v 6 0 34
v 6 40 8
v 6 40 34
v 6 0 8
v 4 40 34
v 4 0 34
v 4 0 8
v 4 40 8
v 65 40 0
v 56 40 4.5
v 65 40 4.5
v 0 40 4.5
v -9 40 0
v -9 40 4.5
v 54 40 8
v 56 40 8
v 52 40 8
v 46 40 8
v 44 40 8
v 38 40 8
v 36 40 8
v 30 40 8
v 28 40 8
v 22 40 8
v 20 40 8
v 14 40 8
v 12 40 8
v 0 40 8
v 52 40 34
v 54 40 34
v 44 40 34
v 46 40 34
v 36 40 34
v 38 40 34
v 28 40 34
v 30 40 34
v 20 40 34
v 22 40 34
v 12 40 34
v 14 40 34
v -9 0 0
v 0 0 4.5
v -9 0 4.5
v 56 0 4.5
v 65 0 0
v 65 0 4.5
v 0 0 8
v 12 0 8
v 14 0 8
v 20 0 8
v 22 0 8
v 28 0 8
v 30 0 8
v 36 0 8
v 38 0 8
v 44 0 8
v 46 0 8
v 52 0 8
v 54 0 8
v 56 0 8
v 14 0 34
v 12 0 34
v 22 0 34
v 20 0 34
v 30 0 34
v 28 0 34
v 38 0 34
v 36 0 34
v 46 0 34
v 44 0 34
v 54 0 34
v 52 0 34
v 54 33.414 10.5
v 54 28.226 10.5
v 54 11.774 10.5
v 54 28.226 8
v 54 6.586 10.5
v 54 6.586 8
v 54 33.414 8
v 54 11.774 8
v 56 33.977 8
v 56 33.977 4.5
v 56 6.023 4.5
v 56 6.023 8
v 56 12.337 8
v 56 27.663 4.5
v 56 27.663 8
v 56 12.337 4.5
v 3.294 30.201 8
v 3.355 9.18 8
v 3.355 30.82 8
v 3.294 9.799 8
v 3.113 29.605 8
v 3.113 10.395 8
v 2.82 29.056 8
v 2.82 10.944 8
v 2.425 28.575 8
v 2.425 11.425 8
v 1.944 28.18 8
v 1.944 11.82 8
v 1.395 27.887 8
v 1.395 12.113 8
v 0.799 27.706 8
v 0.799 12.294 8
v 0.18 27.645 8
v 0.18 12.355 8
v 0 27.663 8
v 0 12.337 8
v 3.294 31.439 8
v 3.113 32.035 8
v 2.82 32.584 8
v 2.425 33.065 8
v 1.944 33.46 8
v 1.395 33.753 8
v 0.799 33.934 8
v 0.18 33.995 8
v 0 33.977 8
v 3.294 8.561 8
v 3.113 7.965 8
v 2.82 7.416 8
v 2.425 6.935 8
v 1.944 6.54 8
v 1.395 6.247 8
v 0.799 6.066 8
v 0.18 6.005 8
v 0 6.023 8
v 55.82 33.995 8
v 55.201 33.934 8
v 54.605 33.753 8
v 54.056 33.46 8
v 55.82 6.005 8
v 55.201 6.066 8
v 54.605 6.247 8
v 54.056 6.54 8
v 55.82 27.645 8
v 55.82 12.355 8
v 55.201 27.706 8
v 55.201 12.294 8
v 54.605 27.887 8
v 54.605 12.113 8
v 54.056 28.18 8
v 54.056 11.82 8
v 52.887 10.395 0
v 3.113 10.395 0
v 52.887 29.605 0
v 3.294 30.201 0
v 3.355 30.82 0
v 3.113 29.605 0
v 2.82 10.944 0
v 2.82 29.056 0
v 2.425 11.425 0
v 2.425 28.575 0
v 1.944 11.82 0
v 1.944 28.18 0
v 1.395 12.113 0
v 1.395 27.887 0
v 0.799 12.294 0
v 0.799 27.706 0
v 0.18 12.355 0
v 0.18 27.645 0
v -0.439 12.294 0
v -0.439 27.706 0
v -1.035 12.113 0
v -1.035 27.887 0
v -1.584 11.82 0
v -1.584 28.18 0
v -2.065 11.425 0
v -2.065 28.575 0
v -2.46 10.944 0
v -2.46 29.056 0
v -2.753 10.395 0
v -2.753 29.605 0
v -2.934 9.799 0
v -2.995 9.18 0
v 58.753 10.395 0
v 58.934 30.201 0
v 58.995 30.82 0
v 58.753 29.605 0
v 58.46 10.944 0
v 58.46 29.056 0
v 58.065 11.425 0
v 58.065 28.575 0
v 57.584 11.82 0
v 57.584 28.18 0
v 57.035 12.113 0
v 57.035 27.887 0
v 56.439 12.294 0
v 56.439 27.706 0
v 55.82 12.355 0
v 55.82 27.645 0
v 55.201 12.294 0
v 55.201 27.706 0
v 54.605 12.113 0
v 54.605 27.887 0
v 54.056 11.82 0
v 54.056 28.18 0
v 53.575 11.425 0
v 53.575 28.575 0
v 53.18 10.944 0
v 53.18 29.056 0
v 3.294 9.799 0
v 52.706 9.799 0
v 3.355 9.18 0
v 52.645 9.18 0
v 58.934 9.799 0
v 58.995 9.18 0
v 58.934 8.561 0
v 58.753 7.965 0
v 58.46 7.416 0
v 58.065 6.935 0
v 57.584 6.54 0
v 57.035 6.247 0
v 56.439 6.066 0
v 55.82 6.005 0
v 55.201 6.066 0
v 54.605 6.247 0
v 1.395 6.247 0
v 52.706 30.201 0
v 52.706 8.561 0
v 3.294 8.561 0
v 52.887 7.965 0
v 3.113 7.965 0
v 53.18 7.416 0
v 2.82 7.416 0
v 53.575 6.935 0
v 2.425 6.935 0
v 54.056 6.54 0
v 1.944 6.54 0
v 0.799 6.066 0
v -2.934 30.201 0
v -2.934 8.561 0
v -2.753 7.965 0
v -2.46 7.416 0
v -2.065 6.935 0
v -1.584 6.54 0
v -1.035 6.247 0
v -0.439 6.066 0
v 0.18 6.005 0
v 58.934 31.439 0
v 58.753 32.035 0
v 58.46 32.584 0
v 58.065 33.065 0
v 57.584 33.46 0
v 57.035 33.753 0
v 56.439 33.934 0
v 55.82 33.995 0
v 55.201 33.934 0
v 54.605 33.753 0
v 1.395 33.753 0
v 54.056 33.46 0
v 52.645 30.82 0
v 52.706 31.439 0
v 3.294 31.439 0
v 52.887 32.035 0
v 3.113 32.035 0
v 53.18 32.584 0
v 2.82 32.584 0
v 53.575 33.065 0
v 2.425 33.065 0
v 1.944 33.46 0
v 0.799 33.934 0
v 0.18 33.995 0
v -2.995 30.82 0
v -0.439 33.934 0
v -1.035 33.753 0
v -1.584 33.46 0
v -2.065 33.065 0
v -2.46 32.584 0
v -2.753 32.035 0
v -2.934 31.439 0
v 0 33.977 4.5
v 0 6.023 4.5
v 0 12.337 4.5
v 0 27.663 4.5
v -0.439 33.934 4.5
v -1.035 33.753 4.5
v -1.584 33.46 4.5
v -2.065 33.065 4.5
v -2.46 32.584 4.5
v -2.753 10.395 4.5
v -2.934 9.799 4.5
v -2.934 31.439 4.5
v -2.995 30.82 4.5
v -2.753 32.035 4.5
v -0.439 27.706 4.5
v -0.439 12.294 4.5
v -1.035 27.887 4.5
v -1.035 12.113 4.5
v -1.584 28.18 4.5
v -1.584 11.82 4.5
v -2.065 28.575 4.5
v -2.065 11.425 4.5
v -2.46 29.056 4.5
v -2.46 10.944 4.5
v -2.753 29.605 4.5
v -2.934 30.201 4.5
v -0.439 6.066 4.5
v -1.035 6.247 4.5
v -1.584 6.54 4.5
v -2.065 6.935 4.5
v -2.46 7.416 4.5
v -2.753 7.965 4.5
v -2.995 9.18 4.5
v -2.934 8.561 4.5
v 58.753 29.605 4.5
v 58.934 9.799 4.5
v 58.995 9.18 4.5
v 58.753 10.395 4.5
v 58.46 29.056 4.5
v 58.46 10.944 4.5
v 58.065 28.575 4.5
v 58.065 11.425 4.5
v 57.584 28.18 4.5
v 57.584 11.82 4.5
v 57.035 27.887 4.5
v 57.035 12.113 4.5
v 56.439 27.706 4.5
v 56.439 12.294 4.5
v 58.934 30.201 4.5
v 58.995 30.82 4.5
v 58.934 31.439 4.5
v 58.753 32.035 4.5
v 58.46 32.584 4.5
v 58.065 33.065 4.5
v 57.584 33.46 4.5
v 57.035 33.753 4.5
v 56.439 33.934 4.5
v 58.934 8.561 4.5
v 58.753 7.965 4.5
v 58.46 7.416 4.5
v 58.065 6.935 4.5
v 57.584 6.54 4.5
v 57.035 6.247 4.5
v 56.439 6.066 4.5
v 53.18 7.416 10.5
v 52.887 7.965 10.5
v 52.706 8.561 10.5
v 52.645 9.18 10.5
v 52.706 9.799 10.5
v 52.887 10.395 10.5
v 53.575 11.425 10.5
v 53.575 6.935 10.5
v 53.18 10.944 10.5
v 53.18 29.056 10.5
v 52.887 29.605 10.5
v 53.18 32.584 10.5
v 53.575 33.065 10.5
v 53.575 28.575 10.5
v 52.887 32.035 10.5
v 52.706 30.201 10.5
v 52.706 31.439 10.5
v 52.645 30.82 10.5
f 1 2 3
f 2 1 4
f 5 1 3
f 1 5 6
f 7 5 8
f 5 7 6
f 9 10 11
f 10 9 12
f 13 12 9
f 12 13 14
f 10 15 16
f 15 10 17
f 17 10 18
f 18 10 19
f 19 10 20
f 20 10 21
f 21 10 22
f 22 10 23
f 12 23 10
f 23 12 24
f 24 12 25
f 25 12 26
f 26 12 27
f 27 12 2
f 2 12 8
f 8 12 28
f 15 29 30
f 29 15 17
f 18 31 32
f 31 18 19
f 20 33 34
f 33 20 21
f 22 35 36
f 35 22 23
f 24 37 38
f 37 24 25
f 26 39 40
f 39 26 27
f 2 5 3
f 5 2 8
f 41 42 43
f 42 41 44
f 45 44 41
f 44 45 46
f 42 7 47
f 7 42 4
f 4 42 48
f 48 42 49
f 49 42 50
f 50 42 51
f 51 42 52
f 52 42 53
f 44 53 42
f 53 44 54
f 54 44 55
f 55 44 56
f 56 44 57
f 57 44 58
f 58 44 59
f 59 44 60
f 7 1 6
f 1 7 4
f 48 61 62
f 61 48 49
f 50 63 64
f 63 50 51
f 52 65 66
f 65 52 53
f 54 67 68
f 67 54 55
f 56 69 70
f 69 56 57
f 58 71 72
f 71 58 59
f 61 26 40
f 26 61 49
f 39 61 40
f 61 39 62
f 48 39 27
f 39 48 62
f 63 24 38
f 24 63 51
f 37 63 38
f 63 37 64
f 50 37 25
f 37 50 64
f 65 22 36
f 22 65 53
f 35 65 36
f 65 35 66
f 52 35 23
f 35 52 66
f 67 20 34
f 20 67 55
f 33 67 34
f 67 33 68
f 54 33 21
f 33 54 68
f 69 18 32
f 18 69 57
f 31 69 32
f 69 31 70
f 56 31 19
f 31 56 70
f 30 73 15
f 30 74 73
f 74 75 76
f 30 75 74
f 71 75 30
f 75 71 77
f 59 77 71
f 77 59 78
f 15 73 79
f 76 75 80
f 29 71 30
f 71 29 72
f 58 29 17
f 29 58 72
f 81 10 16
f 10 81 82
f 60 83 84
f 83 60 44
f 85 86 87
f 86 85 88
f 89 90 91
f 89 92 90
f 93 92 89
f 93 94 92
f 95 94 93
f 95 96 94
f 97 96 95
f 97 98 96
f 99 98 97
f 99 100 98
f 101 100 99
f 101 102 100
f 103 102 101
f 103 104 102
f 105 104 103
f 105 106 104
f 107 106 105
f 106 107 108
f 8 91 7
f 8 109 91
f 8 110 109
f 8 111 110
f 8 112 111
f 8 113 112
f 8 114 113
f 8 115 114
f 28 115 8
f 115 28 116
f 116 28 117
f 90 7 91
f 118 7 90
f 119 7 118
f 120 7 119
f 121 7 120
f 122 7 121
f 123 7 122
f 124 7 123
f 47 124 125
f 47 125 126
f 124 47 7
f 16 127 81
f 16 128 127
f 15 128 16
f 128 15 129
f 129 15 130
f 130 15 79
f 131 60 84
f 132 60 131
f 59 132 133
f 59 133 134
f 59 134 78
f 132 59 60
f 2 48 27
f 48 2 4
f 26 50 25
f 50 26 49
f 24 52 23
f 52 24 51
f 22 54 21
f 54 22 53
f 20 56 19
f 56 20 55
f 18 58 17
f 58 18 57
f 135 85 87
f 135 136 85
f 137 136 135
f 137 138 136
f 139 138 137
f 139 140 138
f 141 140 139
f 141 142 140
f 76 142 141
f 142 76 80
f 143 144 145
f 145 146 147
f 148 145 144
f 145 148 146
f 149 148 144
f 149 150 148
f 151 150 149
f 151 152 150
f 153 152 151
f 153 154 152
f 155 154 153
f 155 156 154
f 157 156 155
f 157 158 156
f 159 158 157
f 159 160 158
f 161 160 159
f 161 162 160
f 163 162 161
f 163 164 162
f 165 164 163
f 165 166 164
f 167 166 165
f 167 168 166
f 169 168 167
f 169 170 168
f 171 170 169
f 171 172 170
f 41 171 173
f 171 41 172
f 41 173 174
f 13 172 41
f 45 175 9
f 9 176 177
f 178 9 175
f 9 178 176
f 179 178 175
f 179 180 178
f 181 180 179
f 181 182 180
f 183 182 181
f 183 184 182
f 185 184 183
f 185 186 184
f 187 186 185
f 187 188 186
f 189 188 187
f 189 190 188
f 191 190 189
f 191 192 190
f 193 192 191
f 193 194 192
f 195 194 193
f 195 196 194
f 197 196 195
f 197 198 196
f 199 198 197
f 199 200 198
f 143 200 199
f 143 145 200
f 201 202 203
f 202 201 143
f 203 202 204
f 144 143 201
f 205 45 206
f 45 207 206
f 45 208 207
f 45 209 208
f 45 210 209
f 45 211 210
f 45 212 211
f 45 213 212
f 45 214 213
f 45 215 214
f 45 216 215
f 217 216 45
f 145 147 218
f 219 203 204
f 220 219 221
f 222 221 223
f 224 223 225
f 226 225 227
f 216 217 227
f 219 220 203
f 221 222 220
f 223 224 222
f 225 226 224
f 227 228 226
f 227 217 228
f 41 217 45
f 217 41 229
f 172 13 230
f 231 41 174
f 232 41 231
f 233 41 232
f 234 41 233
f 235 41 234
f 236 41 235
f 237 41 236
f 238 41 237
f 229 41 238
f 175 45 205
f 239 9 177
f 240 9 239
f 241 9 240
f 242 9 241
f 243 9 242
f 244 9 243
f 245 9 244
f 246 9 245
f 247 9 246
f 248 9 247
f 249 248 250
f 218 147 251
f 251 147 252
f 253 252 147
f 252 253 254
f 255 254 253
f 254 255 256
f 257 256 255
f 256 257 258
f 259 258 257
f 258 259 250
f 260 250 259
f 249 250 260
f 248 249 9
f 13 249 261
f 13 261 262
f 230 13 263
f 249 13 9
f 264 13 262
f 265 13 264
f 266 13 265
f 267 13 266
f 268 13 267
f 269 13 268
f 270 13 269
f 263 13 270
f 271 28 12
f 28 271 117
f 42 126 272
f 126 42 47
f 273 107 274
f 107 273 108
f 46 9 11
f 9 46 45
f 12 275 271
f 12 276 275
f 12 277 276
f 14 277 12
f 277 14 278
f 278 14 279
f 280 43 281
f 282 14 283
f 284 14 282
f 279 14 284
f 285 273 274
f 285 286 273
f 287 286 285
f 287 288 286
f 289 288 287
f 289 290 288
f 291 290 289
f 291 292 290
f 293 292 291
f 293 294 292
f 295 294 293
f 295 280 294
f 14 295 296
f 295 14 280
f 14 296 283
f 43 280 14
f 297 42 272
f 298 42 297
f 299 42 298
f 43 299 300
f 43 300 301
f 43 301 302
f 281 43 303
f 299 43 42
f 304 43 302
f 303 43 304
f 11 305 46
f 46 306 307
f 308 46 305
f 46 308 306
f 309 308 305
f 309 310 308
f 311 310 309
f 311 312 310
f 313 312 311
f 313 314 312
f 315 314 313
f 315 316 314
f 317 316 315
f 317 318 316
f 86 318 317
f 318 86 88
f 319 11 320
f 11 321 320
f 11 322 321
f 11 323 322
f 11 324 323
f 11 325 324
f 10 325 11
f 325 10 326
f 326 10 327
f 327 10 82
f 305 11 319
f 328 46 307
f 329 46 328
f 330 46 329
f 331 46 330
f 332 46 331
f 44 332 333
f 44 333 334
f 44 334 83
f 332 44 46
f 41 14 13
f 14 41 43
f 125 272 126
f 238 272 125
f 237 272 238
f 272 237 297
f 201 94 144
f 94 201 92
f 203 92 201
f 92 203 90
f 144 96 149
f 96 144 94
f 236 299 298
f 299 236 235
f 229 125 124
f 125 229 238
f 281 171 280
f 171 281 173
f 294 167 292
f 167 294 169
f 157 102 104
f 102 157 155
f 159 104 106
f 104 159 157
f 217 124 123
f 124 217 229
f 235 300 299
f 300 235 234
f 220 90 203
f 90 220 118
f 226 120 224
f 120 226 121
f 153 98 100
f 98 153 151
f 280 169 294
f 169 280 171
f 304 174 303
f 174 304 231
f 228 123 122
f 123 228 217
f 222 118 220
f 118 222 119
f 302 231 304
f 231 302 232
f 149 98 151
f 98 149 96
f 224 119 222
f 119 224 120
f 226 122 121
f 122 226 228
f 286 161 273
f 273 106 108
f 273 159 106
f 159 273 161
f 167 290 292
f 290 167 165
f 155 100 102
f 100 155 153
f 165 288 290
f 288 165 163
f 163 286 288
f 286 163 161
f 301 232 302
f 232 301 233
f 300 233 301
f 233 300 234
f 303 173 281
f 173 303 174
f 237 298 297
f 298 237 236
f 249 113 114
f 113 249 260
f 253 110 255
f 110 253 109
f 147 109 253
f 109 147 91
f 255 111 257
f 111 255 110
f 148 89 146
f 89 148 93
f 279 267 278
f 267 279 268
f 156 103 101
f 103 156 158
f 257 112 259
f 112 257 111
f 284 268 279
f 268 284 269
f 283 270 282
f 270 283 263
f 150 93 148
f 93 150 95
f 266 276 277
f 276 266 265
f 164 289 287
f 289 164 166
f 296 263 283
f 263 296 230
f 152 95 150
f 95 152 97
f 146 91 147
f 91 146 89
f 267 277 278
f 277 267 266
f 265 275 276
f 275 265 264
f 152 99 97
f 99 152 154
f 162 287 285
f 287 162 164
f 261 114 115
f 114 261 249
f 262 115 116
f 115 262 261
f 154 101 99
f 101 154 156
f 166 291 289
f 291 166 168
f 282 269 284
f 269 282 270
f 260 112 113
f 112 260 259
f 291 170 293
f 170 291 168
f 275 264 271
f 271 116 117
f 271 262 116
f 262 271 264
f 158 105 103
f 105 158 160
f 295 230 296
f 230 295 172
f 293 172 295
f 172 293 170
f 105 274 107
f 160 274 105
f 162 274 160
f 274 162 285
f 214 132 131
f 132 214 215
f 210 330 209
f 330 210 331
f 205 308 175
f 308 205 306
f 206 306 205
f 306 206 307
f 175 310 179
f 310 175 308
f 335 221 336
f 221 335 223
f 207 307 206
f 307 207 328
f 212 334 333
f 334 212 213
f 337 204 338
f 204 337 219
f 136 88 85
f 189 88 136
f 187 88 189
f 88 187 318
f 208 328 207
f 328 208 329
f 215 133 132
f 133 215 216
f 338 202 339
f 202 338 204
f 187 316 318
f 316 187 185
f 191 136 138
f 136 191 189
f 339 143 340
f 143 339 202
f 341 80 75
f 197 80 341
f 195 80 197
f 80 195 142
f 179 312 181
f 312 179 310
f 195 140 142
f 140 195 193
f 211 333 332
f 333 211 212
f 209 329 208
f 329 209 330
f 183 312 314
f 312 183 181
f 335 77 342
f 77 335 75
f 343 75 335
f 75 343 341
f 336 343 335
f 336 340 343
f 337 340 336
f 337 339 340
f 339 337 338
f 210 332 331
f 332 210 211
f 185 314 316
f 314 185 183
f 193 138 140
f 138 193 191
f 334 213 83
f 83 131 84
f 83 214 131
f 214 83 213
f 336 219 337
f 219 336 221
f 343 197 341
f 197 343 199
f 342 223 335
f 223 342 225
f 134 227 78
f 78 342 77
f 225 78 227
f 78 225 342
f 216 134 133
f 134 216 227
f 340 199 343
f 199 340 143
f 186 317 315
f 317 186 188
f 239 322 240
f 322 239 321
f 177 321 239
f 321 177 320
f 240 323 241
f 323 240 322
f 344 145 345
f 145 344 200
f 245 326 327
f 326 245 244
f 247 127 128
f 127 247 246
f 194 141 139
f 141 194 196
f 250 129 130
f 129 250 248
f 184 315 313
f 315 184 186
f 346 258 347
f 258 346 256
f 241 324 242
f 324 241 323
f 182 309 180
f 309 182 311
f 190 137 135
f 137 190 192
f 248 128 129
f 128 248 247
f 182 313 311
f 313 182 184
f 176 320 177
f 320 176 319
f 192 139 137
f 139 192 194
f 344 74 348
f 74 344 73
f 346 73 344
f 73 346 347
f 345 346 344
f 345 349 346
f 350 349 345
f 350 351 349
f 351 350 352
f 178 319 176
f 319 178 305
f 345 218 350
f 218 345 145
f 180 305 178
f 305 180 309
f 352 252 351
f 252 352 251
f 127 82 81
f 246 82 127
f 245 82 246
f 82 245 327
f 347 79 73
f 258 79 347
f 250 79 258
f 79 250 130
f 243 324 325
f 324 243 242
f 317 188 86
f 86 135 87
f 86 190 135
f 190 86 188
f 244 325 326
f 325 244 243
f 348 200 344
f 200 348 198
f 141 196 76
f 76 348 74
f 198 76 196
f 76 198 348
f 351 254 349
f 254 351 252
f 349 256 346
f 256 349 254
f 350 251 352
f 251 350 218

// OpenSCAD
$fn = 32;

// ----------------------------------------------------------------------
// Finned heat sink: 56 x 40 mm base, 26 mm fins
// ----------------------------------------------------------------------

// --- parameters (mm) ---
base_w = 56;              // base width
base_d = 40;              // base depth
base_t = 8;               // base thickness
fin_h = 26;               // fin height above the base
holes_d = 6.35;           // fixing holes
hole_x = 27.82;           // hole offset in x
hole_y = 10.82;           // hole offset in y
fin_t = 2;                // fin thickness
fin_pitch = 8;            // fin pitch
fin_count = 7;            // number of fins
fin_x0 = 4;               // first fin offset
flange_w = 74;            // flange plate width
flange_t = 4;             // flange plate thickness

difference() {
  union() {
    cube([base_w, base_d, base_t]);
    for (i = [0 : fin_count - 1]) {
      translate([fin_x0 + i * fin_pitch, 0, base_t - 0.5]) cube([fin_t, base_d, fin_h + 0.5]);
    }
    /* mounting flange, a wider plate sharing the base bottom */
    translate([(base_w - flange_w) / 2, 0, 0]) cube([flange_w, base_d, flange_t + 0.5]);
  }
  /* fixing holes through the base, 2.5 mm clear on both sides */
  for (hx = [-27.82, 27.82]) {
    for (hy = [-10.82, 10.82]) {
      translate([base_w / 2 + hx, base_d / 2 + hy, -2.5]) cylinder(h = base_t + 5, d = holes_d);
    }
  }
}
